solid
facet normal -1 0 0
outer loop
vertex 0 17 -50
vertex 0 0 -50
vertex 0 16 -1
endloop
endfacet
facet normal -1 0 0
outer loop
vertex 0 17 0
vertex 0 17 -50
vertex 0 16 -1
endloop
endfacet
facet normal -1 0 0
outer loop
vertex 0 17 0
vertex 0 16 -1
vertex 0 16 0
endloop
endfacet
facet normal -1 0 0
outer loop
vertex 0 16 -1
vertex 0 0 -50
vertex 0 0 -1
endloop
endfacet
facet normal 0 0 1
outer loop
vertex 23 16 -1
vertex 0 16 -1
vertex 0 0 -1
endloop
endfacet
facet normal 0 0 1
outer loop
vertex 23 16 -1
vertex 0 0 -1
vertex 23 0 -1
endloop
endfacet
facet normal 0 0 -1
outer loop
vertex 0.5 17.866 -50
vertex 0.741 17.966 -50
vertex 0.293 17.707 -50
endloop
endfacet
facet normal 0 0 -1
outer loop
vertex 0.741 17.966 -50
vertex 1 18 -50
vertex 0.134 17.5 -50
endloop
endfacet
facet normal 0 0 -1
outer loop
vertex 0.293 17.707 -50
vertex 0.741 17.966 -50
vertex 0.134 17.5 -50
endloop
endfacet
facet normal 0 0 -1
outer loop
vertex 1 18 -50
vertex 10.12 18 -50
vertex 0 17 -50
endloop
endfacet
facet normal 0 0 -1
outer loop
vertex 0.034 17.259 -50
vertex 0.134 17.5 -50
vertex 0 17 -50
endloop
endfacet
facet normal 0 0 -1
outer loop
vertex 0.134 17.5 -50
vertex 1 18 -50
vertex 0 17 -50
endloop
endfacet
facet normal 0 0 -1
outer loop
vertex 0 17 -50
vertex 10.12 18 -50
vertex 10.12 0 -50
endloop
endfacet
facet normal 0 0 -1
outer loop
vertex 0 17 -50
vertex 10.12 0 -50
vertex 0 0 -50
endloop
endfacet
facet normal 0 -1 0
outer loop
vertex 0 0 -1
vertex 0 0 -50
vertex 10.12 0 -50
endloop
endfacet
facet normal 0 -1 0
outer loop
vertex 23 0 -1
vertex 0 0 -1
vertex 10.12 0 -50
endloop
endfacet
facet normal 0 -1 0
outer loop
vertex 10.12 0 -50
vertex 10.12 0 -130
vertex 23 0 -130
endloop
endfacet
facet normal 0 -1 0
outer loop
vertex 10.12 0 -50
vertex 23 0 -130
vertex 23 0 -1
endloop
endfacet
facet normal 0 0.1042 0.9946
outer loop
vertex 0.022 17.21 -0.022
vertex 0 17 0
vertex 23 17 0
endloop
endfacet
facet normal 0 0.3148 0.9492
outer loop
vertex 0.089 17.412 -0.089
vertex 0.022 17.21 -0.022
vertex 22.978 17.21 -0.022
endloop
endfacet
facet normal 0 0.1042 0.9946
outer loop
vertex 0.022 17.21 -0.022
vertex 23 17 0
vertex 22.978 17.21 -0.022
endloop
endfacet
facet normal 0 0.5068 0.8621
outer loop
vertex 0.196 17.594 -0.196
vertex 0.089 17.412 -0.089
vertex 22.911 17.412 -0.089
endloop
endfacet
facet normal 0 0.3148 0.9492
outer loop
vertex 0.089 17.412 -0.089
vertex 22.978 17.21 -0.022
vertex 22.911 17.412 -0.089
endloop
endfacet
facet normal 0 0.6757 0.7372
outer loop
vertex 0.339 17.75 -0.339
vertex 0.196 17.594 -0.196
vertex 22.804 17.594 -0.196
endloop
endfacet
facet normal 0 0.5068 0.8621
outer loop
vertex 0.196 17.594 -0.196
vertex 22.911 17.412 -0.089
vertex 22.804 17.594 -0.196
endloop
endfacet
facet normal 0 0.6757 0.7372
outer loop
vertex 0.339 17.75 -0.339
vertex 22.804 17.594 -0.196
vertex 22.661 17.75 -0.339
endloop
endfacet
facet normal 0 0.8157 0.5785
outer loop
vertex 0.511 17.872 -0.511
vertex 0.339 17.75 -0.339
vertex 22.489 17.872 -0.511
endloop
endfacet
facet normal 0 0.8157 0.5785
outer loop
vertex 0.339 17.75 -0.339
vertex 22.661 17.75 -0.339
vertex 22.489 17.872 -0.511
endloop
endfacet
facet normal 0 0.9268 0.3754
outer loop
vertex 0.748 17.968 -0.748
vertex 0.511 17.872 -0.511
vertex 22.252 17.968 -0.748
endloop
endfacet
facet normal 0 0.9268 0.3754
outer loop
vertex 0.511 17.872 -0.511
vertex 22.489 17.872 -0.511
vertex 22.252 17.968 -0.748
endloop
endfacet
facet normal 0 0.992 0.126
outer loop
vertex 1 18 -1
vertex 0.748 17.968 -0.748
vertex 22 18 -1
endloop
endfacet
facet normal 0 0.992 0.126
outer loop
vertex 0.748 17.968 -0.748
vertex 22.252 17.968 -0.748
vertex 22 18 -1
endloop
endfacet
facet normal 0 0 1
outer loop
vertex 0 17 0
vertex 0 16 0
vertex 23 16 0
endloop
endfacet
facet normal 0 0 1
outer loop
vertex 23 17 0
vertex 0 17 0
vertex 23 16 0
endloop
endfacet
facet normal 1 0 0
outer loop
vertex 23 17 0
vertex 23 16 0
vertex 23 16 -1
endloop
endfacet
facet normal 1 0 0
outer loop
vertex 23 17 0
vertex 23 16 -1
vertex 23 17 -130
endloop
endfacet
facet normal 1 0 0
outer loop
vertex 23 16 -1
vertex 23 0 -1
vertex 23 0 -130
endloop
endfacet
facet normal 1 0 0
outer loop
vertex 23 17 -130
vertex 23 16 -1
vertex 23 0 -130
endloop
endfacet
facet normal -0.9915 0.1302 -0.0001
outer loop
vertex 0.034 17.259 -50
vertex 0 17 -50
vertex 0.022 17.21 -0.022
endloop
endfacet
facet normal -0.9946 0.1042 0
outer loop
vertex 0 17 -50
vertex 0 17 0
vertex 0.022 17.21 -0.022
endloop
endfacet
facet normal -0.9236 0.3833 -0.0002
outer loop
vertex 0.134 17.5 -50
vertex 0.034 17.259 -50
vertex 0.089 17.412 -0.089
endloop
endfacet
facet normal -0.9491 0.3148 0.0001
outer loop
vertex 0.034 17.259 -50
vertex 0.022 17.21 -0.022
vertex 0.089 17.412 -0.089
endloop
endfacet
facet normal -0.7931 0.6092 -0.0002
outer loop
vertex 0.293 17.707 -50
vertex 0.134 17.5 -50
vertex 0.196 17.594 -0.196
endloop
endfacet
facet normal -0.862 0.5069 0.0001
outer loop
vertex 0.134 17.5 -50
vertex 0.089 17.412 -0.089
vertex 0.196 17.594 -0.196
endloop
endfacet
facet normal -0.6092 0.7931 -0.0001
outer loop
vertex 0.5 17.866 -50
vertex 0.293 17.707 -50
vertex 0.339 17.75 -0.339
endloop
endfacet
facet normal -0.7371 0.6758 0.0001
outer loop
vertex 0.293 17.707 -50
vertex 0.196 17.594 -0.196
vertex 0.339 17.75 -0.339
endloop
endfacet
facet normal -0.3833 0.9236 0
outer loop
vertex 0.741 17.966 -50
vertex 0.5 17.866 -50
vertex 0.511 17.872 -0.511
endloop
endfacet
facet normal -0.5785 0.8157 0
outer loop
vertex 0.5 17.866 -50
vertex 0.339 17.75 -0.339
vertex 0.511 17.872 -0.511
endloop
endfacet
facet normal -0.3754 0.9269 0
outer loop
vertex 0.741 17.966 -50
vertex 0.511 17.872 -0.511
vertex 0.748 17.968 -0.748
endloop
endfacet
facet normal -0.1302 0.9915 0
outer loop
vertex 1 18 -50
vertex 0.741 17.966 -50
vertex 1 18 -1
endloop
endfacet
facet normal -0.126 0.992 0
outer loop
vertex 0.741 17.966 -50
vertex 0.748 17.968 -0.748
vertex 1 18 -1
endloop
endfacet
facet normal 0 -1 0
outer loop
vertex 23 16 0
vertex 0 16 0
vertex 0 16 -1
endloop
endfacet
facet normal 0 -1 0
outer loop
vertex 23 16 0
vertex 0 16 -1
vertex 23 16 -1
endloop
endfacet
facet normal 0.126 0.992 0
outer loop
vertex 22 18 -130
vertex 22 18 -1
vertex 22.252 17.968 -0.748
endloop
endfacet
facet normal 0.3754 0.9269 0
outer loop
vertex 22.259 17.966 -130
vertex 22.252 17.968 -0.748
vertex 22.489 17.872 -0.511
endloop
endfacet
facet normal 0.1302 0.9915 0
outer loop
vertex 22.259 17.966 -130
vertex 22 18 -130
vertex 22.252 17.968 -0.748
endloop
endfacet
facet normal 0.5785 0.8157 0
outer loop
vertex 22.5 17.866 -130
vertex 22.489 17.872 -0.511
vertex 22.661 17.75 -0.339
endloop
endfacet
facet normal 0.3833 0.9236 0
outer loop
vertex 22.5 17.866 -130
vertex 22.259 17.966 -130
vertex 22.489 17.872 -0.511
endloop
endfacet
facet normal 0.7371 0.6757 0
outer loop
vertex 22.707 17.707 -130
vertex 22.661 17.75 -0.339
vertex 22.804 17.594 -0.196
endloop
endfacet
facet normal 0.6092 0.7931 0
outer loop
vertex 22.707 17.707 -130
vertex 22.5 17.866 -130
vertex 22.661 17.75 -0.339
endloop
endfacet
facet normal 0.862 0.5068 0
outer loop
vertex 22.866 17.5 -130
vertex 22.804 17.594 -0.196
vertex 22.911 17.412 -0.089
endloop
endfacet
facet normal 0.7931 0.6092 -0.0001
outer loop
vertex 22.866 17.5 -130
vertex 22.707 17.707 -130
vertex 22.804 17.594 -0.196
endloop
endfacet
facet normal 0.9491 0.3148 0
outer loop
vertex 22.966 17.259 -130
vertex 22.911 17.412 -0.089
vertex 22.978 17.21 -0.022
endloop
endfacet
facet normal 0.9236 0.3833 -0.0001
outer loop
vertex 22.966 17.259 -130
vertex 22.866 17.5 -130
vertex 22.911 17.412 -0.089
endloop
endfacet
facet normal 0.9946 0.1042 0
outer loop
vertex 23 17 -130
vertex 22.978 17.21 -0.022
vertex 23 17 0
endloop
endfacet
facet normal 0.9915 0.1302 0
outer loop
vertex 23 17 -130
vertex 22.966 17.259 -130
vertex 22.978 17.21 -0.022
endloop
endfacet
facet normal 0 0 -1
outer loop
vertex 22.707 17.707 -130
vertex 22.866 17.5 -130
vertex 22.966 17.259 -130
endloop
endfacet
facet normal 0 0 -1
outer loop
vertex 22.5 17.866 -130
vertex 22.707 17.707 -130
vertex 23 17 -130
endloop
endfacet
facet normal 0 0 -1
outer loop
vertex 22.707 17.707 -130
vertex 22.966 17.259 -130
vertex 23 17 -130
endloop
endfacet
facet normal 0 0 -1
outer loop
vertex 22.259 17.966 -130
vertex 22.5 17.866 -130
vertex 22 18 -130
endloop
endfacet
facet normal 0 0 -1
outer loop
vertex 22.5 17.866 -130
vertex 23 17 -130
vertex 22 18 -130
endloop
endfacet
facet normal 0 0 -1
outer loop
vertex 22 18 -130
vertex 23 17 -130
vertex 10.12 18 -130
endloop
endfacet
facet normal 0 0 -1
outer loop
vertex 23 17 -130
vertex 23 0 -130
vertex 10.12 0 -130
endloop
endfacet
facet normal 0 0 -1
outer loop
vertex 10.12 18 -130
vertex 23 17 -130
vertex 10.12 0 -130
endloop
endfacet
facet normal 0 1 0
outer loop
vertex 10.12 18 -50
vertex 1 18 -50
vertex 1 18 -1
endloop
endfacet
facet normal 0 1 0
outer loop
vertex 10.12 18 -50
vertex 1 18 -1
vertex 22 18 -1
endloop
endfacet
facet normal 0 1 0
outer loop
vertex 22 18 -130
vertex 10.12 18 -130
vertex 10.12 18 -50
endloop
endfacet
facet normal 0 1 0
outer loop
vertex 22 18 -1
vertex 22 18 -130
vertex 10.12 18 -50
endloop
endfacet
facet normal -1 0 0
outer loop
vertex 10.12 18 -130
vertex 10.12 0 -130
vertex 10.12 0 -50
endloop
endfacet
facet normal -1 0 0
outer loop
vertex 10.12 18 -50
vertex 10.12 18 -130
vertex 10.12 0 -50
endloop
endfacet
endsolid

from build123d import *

# Parameters (mm, degrees)
SALIENTE_EXTRUIR1_DEPTH = 18
CROQUIS4_W              = 23
CROQUIS4_H              = 16
CORTAR_EXTRUIR1_DEPTH   = 1
REDONDEO1_R             = 1


with BuildPart() as part:
    # Croquis2 → Saliente-Extruir1 (new body)
    with BuildSketch(Plane(origin=(0, 0, 0), x_dir=(1, 0, 0), z_dir=(0, 1, 0))):
        Polygon((0, 50), (0, 0), (23, 0), (23, 50), (23, 130), (10.12, 130), (10.12, 50), align=None)
    extrude(amount=SALIENTE_EXTRUIR1_DEPTH)

    # Croquis4 → Cortar-Extruir1 (cut)
    with BuildSketch(Plane.XY):
        with Locations((11.5, 8)):
            Rectangle(CROQUIS4_W, CROQUIS4_H)
    extrude(amount=-CORTAR_EXTRUIR1_DEPTH, mode=Mode.SUBTRACT)

    # Redondeo1
    redondeo1_edges = [part.edges().sort_by_distance(p)[0] for p in [
        (0, 18, -25),
        (11.5, 18, 0),
        (23, 18, -65),
    ]]
    fillet(redondeo1_edges, radius=REDONDEO1_R)


solid = part.part
